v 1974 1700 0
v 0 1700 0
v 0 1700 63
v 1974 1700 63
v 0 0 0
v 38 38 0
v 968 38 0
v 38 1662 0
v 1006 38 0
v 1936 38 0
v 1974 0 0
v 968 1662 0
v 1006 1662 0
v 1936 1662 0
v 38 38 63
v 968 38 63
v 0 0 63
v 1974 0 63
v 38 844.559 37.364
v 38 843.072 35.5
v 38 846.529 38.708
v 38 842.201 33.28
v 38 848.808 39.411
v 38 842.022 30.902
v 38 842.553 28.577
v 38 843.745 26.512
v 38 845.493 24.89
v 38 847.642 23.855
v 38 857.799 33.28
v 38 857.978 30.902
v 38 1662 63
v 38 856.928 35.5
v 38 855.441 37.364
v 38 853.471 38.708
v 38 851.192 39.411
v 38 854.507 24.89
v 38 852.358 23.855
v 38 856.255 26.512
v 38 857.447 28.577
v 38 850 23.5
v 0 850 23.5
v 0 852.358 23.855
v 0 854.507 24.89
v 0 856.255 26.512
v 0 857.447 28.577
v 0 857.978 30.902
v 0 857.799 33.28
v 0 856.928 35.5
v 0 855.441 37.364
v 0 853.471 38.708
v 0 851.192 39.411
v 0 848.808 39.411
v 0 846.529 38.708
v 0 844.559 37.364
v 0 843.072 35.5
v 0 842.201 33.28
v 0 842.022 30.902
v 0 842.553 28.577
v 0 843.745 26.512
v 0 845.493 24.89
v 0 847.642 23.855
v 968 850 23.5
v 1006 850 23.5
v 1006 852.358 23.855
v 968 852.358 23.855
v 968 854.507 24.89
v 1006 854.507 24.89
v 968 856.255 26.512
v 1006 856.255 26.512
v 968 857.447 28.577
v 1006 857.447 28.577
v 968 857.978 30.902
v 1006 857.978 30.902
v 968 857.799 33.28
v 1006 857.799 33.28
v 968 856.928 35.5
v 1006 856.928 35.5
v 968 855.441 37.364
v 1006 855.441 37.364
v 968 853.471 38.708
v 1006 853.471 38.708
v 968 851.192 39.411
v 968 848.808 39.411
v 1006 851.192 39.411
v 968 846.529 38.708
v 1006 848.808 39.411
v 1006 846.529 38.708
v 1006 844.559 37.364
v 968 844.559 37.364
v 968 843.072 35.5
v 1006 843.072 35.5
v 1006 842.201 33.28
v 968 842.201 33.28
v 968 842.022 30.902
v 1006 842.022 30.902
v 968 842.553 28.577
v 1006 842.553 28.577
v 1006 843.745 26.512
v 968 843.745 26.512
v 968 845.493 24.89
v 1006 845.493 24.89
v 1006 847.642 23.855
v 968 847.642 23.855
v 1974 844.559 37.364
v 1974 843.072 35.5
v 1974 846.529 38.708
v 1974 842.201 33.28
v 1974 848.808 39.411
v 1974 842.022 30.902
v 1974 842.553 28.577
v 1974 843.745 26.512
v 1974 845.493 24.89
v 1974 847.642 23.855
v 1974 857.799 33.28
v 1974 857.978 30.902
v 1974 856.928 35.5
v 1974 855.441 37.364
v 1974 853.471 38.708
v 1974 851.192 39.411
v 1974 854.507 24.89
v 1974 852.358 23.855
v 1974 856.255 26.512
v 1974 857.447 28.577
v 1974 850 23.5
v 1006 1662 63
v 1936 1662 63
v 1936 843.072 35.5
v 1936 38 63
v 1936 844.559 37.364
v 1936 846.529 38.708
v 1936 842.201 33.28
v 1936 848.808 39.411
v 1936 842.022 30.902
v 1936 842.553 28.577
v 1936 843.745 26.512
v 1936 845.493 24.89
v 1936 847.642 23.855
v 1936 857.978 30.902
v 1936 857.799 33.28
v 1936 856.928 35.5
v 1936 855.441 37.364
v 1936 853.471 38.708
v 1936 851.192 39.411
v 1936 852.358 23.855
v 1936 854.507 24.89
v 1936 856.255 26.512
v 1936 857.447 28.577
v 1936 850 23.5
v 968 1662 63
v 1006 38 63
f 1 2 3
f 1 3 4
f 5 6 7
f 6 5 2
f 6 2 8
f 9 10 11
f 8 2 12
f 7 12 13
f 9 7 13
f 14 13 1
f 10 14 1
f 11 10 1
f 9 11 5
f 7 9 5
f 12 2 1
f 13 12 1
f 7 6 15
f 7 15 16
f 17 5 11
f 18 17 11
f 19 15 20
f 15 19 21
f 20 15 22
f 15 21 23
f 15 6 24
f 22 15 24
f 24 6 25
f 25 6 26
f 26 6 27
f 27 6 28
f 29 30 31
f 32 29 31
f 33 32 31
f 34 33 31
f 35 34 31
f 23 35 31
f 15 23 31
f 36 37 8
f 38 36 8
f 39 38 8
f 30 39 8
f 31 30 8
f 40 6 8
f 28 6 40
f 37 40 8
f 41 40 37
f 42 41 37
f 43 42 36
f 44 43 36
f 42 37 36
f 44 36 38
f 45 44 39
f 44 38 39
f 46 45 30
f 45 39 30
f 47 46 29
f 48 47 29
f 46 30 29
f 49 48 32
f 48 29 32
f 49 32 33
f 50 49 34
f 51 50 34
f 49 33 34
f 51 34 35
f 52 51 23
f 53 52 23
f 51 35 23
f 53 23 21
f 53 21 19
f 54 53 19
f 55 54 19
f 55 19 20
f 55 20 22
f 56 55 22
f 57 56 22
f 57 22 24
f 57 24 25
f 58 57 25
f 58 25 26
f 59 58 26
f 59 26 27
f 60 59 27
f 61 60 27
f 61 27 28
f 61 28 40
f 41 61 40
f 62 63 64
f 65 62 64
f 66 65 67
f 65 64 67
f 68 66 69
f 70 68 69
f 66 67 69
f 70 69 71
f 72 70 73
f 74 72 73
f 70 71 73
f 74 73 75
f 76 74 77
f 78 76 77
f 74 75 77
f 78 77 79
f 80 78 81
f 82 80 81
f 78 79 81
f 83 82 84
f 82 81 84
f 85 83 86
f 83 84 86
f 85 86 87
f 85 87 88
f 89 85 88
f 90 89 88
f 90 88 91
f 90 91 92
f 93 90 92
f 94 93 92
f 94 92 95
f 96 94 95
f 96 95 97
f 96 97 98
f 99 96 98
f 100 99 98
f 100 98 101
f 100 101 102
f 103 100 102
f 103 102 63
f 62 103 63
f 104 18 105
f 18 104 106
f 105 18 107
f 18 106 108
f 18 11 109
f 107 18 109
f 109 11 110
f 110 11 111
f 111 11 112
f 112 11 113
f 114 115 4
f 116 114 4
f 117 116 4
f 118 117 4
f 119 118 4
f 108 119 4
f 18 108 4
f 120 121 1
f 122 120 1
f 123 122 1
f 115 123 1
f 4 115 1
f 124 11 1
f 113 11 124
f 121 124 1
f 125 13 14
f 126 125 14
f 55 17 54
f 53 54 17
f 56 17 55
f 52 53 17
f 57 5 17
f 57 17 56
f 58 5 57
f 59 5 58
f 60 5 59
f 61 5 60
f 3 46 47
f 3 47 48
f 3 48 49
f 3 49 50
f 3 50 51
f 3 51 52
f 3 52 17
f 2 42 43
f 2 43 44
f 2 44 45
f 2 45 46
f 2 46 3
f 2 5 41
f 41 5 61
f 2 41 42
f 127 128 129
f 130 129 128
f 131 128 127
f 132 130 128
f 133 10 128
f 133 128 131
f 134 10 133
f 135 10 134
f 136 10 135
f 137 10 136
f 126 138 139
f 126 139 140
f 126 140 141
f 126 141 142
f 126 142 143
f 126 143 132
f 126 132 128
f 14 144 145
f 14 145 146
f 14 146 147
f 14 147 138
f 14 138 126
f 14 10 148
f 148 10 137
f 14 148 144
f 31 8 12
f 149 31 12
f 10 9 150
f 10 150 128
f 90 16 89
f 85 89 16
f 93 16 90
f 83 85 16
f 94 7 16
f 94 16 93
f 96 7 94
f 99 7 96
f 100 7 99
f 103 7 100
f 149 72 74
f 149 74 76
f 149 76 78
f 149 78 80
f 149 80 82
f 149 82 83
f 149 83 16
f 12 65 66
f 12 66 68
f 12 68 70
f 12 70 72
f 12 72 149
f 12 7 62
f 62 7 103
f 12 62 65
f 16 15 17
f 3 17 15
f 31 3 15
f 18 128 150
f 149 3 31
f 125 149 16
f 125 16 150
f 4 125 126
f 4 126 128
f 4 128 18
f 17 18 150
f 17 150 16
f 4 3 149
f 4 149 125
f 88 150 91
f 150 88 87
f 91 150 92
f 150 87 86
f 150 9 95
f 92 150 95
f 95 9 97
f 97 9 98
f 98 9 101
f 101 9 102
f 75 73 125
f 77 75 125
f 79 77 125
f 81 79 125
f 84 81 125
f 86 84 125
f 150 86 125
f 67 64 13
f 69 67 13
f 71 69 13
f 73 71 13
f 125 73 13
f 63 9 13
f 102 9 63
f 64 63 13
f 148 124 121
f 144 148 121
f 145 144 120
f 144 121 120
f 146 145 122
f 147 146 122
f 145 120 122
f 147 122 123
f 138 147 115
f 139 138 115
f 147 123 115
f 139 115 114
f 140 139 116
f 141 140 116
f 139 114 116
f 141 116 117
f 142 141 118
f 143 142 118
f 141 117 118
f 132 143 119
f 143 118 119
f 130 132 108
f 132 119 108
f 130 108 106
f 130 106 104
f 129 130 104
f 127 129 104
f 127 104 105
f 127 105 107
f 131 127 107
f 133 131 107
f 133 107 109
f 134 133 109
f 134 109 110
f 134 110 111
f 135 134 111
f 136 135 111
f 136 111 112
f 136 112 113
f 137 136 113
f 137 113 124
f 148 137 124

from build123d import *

# Parameters (mm, degrees)
ESQUISSE1_W             = 1974
ESQUISSE1_H             = 1700
ESQUISSE1_W_2           = 930
ESQUISSE1_H_2           = 1624
BOSS_EXTRU_1_DEPTH      = 63
ESQUISSE2_R             = 8
ENL_V_MAT_EXTRU_1_DEPTH = 2606.886605361


with BuildPart() as part:
    # Esquisse1 → Boss.-Extru.1 (new body)
    with BuildSketch(Plane.XY):
        with Locations((987, 850)):
            Rectangle(ESQUISSE1_W, ESQUISSE1_H)
        with Locations((1471, 850)):
            Rectangle(ESQUISSE1_W_2, ESQUISSE1_H_2, mode=Mode.SUBTRACT)
        with Locations((503, 850)):
            Rectangle(ESQUISSE1_W_2, ESQUISSE1_H_2, mode=Mode.SUBTRACT)
    extrude(amount=BOSS_EXTRU_1_DEPTH)

    # Esquisse2 → Enlèv. mat.-Extru.1 (cut, through all)
    with BuildSketch(Plane(origin=(1974, 0, 0), x_dir=(0, 0, -1), z_dir=(1, 0, 0))):
        with Locations((-31.5, 850)):
            Circle(ESQUISSE2_R)
    extrude(amount=-ENL_V_MAT_EXTRU_1_DEPTH, mode=Mode.SUBTRACT)


solid = part.part
